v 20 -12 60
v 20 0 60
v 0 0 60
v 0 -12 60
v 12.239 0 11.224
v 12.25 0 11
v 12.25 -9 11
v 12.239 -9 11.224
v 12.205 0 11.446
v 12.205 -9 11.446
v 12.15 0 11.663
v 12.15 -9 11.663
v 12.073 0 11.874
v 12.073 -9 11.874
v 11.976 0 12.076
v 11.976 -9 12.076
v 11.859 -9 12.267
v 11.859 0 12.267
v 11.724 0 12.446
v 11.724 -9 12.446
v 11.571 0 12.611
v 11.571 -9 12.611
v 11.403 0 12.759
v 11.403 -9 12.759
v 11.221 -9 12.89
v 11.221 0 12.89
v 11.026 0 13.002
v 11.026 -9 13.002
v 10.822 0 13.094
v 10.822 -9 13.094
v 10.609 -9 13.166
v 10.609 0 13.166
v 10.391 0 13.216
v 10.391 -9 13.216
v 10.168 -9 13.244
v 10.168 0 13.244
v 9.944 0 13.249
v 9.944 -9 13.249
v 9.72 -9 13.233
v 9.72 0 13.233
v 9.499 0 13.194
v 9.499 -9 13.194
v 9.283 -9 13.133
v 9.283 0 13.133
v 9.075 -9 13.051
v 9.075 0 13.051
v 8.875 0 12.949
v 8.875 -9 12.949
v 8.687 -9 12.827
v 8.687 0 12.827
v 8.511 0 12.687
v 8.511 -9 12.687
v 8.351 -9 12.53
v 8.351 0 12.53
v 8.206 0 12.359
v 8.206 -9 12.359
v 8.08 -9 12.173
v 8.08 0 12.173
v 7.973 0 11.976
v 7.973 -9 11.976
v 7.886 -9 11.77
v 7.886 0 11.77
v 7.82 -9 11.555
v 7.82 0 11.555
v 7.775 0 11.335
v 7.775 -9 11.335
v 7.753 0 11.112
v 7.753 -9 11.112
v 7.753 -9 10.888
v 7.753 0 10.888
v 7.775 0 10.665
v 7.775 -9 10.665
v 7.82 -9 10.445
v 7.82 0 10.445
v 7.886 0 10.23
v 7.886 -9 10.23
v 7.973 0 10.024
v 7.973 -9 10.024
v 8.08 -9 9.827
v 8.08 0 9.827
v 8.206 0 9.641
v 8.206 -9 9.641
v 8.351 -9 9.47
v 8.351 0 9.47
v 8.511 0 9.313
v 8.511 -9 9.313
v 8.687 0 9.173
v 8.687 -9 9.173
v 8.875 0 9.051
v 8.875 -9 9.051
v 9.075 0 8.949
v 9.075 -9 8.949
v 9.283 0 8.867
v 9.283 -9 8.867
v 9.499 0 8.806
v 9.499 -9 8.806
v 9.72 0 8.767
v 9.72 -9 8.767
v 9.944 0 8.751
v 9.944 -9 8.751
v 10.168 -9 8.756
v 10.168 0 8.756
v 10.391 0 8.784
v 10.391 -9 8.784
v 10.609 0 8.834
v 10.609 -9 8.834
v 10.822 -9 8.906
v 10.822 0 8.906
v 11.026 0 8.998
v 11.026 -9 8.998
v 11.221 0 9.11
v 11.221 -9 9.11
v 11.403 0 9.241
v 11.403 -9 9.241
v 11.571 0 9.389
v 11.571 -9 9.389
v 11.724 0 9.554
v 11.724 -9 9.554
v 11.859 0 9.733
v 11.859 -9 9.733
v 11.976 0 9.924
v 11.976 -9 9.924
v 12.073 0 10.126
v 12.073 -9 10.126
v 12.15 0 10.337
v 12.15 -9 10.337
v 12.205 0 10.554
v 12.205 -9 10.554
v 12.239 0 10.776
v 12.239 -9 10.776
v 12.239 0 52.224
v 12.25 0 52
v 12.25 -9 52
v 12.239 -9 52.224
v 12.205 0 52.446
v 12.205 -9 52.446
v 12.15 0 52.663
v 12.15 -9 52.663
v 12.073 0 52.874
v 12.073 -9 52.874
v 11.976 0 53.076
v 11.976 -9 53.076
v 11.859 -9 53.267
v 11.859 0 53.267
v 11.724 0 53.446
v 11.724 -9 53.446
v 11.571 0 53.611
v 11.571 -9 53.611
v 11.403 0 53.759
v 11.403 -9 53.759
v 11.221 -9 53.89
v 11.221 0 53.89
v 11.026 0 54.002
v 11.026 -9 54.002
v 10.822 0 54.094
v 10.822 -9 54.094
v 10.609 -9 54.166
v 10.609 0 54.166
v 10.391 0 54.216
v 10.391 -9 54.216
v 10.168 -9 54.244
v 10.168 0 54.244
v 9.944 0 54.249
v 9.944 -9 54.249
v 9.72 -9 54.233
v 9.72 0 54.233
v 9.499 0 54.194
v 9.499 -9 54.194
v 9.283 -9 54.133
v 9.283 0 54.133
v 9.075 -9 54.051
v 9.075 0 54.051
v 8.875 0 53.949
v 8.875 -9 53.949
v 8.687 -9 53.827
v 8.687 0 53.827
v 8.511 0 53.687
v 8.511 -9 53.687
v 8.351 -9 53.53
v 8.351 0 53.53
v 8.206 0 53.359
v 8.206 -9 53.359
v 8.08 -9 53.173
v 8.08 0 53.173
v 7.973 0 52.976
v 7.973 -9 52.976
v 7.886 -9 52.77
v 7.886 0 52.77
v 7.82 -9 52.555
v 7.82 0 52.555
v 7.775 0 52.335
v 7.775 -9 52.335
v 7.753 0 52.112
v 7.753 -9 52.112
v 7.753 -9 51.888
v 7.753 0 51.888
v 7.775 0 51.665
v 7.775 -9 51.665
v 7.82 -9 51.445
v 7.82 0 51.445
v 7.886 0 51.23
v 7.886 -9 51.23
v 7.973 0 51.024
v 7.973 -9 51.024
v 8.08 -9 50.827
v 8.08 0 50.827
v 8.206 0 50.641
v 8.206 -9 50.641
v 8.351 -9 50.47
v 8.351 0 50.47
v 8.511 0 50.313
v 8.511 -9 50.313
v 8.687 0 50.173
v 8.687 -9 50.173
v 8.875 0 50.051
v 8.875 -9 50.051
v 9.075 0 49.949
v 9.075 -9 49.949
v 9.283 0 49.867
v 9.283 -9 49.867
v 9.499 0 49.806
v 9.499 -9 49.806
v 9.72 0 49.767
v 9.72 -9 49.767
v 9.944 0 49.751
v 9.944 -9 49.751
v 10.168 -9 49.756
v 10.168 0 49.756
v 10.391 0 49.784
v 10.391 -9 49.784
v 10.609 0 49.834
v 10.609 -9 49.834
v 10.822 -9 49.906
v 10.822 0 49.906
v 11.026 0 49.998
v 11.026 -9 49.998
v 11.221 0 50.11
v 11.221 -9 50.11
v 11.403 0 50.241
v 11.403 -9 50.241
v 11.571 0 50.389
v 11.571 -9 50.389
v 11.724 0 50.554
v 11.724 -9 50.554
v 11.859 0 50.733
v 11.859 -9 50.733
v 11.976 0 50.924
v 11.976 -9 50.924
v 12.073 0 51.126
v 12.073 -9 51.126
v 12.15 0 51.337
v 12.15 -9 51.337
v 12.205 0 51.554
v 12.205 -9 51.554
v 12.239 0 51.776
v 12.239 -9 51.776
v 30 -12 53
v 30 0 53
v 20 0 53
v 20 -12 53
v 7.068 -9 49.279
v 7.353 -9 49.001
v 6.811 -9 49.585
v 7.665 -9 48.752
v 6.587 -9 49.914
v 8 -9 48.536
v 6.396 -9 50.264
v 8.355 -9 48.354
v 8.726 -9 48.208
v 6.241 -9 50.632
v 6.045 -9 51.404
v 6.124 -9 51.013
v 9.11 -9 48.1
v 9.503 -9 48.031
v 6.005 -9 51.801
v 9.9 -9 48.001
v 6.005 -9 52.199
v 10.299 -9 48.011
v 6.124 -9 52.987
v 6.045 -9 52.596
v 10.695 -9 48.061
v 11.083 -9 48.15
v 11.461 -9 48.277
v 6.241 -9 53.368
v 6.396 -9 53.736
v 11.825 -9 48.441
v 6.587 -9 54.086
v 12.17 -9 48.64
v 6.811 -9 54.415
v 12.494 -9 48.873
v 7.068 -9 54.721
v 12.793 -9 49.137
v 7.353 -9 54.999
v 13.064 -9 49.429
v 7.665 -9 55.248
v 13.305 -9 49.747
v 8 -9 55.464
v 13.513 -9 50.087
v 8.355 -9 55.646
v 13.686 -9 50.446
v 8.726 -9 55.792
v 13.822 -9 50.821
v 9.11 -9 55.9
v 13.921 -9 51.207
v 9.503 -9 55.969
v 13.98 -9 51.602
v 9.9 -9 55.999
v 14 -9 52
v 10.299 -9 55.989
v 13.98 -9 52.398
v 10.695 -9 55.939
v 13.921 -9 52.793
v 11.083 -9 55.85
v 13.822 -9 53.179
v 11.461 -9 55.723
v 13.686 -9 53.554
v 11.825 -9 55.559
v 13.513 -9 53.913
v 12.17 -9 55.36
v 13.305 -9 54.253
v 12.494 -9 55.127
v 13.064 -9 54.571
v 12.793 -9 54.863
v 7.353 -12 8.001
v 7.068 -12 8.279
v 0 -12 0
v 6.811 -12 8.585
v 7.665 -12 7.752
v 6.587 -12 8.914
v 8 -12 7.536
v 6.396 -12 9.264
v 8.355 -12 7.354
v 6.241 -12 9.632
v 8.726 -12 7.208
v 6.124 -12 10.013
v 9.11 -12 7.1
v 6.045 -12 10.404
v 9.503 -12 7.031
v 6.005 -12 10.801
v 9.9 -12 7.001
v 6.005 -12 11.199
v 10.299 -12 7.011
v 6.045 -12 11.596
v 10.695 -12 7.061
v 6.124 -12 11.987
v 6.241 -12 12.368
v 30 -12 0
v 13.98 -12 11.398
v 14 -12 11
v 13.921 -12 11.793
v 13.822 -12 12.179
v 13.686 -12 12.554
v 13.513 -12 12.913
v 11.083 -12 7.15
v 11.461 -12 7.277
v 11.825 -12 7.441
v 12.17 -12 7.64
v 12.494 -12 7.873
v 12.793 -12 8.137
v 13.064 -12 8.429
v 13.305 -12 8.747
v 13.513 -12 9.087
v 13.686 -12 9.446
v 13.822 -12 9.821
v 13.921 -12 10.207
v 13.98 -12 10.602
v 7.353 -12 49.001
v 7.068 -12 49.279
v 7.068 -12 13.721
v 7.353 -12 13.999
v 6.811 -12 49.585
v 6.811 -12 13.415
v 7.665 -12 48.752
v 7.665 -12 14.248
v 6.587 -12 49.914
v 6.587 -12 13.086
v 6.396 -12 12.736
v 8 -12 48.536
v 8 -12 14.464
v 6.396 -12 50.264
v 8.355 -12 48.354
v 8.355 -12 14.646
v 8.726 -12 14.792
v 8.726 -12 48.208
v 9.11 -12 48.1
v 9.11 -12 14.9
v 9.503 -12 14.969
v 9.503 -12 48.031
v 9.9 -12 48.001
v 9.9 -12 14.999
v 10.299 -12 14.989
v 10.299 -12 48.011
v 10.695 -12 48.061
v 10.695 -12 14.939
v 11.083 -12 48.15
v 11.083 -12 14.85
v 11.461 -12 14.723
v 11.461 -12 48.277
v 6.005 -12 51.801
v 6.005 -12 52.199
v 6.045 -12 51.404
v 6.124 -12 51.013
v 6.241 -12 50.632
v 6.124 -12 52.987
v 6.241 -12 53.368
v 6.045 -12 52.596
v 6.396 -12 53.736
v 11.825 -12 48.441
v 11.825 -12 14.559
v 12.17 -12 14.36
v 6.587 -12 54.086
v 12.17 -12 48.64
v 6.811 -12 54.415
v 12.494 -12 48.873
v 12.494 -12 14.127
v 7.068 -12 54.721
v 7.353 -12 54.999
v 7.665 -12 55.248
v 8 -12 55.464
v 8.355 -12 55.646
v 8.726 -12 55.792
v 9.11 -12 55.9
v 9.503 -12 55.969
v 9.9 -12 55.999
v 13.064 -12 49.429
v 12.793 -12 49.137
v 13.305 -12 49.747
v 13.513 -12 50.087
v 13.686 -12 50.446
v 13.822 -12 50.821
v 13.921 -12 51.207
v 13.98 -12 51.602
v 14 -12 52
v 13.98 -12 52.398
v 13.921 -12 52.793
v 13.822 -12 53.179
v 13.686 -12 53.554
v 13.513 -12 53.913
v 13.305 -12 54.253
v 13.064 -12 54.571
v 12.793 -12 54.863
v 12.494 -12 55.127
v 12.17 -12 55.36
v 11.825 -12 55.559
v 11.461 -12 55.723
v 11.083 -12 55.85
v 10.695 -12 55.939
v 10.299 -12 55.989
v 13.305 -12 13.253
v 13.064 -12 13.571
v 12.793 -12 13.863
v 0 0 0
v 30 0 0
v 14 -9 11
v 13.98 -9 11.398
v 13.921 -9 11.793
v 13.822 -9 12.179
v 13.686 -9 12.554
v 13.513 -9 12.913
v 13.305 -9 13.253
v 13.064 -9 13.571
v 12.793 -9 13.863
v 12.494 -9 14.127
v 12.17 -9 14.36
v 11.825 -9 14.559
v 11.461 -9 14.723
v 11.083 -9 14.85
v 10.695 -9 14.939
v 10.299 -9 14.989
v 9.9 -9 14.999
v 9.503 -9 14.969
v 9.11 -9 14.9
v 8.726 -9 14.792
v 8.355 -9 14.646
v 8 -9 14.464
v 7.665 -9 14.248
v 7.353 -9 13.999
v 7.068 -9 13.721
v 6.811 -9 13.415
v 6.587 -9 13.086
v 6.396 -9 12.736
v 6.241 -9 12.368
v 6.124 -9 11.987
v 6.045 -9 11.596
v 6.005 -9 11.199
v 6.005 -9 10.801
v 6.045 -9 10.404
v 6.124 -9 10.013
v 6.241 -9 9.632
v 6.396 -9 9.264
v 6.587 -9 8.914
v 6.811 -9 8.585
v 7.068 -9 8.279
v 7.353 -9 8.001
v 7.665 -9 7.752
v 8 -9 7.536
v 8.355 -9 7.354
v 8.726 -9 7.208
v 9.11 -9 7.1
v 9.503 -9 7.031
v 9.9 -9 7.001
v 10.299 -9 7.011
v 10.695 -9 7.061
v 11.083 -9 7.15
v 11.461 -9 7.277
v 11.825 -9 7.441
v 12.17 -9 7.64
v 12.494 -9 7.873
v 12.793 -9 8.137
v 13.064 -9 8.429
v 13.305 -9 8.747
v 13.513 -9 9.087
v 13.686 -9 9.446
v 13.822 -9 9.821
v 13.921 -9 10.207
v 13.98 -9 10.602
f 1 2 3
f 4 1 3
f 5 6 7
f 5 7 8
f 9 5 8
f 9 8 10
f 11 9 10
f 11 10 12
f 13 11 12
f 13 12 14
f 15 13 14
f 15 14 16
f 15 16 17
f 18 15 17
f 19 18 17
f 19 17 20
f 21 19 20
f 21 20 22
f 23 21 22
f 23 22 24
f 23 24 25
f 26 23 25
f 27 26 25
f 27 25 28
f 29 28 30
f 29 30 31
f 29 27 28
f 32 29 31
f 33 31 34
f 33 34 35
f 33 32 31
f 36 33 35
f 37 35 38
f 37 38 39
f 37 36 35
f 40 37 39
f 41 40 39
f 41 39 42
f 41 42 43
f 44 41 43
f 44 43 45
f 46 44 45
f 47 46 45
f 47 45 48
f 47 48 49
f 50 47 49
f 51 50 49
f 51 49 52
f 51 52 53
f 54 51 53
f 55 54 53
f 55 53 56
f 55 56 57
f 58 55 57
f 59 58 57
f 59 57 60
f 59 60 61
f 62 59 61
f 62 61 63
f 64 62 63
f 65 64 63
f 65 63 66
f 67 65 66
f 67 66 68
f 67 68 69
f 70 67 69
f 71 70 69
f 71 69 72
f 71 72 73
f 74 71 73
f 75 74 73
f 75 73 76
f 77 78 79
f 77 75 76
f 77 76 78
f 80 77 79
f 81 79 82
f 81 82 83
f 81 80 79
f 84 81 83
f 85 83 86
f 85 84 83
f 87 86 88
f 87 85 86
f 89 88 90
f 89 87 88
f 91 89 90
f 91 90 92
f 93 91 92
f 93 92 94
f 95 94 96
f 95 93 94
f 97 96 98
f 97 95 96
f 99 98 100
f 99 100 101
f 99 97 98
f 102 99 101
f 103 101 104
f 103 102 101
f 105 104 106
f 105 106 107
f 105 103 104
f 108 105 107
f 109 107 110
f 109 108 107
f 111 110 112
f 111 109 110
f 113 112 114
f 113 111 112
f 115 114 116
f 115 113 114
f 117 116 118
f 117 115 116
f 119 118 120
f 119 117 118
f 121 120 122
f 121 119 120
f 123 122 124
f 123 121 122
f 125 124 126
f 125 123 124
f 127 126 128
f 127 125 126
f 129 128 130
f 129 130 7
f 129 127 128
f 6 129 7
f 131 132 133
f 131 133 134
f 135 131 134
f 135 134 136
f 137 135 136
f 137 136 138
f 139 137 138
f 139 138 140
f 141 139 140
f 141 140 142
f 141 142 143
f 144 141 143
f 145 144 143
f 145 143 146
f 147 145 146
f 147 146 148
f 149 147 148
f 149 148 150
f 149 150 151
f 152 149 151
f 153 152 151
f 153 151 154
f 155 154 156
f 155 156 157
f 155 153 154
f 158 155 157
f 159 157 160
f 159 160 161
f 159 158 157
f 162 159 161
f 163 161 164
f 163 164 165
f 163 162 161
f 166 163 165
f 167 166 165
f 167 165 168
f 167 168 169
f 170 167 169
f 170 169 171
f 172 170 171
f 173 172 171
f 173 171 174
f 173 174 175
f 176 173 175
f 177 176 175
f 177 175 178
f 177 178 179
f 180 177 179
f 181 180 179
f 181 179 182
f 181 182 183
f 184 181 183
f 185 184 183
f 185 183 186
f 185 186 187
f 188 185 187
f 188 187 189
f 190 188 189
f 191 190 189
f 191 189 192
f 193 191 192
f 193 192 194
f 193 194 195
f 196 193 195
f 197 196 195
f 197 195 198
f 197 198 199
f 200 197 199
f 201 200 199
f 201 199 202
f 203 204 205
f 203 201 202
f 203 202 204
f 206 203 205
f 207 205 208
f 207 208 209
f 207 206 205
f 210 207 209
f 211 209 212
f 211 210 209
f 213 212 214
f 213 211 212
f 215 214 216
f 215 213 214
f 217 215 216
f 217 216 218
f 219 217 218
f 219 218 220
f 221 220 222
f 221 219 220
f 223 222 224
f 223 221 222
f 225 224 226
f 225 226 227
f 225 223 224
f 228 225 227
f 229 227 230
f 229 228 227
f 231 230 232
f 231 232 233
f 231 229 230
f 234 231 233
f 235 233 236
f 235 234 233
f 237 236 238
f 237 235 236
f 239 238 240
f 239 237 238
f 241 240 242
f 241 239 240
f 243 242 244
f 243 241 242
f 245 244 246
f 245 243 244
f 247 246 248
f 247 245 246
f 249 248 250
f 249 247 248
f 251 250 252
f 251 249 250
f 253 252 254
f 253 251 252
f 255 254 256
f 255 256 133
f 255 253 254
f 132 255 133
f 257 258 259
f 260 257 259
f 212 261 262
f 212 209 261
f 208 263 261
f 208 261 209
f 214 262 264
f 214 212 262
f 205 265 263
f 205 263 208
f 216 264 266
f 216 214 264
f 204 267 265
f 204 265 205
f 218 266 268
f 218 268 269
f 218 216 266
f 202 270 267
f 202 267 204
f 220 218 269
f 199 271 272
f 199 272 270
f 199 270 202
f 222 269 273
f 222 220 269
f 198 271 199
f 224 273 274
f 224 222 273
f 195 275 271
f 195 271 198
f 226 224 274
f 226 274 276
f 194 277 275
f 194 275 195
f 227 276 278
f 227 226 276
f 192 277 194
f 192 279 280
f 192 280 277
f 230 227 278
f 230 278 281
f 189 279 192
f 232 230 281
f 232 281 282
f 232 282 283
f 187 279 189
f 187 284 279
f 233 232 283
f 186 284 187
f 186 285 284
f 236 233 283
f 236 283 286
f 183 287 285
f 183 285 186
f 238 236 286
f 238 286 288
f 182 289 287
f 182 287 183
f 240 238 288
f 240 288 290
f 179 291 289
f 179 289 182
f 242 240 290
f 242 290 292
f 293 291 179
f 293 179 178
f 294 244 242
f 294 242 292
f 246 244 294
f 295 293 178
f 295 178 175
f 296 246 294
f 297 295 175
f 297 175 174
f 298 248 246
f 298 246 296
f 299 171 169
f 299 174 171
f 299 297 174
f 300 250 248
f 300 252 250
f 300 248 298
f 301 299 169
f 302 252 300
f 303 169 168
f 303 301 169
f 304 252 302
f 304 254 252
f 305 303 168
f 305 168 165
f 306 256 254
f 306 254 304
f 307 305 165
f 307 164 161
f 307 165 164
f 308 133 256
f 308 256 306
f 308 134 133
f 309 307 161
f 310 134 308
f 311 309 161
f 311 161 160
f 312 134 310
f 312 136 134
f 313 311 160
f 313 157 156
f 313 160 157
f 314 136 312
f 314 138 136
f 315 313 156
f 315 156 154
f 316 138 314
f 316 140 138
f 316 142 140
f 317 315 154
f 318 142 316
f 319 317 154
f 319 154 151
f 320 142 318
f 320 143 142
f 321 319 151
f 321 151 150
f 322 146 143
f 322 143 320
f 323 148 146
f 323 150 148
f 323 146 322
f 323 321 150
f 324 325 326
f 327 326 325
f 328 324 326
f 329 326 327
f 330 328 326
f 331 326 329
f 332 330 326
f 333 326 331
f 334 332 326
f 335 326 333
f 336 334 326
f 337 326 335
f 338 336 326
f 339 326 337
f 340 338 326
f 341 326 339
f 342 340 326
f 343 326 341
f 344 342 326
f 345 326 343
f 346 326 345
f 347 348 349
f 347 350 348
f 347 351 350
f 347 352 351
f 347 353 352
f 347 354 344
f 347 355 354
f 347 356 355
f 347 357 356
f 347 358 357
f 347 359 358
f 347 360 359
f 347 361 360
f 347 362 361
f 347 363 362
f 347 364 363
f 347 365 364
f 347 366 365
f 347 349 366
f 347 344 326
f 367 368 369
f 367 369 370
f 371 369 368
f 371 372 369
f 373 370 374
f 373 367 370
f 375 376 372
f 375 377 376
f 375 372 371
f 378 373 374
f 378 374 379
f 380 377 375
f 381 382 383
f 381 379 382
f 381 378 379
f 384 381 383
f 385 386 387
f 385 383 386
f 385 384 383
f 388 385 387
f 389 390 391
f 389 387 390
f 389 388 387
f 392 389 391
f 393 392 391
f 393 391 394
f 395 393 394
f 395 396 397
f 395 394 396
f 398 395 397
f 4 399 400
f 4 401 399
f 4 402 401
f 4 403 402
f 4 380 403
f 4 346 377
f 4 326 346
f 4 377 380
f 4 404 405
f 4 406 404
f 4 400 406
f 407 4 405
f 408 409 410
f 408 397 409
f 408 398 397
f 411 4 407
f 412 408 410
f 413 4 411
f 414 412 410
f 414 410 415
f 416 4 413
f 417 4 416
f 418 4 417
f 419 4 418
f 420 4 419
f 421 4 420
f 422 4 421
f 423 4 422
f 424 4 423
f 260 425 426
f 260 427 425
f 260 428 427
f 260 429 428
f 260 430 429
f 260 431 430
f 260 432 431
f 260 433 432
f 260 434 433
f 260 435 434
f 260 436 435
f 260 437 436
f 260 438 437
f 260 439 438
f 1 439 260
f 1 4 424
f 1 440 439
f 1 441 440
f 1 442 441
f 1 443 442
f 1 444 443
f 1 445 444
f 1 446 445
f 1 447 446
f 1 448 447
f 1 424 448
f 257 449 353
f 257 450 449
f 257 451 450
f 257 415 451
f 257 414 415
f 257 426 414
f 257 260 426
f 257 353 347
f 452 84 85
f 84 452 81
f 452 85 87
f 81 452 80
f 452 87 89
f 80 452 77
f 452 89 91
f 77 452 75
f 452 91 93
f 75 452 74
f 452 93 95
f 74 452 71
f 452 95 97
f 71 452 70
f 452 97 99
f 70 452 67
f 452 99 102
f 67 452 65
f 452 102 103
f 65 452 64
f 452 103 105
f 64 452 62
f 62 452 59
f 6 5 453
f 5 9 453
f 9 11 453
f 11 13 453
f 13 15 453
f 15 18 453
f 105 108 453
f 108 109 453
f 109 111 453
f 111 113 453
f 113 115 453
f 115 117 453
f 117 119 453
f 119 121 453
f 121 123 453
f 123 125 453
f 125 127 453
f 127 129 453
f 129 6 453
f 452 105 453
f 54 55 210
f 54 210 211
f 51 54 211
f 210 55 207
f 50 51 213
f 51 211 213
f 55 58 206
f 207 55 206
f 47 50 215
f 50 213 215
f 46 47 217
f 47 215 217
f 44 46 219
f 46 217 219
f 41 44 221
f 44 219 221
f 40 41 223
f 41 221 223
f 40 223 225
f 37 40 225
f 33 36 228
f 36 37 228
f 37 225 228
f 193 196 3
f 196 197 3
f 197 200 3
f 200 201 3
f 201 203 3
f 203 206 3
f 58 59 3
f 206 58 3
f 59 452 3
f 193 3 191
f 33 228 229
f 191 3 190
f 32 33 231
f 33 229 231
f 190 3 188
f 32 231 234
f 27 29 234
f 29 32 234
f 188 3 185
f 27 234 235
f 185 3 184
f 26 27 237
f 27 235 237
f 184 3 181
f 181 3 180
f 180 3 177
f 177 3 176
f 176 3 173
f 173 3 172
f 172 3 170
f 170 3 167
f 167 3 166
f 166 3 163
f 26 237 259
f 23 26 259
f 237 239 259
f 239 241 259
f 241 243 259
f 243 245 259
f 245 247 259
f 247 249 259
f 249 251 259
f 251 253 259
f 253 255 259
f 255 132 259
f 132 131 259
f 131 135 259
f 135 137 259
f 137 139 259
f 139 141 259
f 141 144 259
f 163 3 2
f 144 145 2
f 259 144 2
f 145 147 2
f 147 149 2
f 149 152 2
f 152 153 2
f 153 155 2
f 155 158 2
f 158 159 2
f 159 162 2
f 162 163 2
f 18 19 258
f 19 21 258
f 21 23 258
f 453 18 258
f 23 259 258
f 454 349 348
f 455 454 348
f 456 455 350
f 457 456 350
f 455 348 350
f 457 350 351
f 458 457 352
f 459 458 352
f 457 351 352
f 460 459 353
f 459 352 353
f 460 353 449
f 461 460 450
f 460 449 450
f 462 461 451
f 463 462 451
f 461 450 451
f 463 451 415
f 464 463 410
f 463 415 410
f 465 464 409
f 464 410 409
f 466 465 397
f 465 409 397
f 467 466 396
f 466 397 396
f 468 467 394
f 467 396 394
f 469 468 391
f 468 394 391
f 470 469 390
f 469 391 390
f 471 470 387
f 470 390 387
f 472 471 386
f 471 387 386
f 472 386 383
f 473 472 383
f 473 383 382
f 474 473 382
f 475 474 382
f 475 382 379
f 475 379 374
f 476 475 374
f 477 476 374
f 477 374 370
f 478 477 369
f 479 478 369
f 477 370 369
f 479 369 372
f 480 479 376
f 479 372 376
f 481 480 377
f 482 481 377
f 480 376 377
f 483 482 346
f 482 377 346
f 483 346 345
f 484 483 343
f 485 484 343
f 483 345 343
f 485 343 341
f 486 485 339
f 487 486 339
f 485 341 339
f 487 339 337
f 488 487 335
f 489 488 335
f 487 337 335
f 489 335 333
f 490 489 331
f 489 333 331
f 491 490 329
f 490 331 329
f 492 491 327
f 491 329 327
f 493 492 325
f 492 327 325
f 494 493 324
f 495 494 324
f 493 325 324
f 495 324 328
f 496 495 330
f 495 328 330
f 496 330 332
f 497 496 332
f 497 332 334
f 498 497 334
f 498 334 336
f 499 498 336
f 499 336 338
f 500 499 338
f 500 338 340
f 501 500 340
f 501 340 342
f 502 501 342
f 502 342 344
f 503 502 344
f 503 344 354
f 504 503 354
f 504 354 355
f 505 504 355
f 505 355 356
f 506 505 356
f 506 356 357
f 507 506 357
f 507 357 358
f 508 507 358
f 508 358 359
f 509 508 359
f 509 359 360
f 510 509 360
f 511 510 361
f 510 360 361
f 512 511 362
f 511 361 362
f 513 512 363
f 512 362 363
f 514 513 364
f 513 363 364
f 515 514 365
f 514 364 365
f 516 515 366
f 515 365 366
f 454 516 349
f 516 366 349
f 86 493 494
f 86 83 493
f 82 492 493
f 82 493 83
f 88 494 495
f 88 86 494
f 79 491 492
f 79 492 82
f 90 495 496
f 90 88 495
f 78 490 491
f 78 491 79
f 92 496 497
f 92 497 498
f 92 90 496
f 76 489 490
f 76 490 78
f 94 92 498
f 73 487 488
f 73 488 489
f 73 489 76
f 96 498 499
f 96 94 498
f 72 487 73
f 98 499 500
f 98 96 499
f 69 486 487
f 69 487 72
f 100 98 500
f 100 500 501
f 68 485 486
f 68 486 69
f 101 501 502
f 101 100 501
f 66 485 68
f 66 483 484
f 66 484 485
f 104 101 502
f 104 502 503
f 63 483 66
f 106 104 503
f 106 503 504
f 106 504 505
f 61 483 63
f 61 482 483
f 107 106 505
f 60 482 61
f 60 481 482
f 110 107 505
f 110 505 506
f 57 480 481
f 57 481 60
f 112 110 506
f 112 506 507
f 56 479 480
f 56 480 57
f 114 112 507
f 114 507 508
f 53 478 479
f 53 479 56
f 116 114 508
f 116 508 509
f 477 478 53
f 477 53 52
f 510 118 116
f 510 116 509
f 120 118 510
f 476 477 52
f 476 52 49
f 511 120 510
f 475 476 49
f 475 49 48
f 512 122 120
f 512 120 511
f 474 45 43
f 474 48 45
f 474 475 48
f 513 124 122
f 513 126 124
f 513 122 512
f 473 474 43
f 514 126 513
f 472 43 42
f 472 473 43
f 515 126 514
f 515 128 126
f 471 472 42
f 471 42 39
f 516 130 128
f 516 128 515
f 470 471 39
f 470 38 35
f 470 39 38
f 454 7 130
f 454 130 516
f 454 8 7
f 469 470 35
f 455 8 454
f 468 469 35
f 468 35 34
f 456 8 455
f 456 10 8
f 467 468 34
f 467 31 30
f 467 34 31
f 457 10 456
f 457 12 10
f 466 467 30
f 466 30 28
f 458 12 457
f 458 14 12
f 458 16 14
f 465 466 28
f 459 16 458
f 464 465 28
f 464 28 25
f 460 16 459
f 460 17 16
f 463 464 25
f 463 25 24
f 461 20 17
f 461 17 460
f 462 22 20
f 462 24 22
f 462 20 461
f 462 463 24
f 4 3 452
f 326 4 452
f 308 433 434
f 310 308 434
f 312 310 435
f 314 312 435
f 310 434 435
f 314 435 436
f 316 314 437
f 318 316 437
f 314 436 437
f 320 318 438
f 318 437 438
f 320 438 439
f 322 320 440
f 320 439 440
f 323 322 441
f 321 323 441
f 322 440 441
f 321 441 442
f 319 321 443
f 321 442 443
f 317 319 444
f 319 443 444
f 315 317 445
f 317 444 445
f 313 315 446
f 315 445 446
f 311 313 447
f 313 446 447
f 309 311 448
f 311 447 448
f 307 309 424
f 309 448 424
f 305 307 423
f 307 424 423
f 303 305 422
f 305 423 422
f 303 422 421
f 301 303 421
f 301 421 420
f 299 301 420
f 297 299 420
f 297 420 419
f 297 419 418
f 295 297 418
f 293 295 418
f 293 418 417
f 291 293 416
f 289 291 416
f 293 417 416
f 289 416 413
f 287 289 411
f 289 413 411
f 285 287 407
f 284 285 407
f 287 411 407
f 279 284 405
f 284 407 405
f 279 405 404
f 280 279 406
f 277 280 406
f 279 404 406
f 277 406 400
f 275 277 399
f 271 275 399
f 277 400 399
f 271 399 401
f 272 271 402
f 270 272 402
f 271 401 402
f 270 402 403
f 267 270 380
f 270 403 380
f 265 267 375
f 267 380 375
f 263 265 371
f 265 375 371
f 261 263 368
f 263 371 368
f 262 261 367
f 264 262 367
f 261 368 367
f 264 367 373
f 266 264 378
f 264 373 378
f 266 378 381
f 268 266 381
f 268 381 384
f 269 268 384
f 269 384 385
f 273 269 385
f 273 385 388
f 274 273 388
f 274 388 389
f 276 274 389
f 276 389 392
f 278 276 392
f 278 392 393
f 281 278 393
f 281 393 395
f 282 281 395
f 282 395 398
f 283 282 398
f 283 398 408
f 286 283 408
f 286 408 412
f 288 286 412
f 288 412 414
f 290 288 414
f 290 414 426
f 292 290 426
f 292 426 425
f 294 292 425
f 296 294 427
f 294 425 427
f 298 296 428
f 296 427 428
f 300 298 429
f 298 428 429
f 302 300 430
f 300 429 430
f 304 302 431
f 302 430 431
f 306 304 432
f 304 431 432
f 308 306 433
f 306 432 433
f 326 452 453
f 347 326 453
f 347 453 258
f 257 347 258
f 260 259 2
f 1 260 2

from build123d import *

# Parameters (mm, degrees)
F0_R     = 2.25
F1_DEPTH = 12
F2_R     = 4
F2_R_2   = 2.25
F3_DEPTH = 3


with BuildPart() as f1:
    # F0 (on Front) → F1 (new body)
    with BuildSketch(Plane.XZ):
        Polygon((0, 60), (0, 0), (30, 0), (30, 53), (20, 53), (20, 60), align=None)
        with Locations((10, 11)):
            Circle(F0_R, mode=Mode.SUBTRACT)
        with Locations((10, 52)):
            Circle(F0_R, mode=Mode.SUBTRACT)
    extrude(amount=F1_DEPTH)

    # F2 (on face) → F3 (cut)
    with BuildSketch(Plane.XZ.offset(12)):
        with Locations((10, 52)):
            Circle(F2_R)
        with Locations((10, 52)):
            Circle(F2_R_2, mode=Mode.SUBTRACT)
        with Locations((10, 11)):
            Circle(F2_R)
        with Locations((10, 11)):
            Circle(F2_R_2, mode=Mode.SUBTRACT)
    extrude(amount=-F3_DEPTH, mode=Mode.SUBTRACT)


solid = f1.part
